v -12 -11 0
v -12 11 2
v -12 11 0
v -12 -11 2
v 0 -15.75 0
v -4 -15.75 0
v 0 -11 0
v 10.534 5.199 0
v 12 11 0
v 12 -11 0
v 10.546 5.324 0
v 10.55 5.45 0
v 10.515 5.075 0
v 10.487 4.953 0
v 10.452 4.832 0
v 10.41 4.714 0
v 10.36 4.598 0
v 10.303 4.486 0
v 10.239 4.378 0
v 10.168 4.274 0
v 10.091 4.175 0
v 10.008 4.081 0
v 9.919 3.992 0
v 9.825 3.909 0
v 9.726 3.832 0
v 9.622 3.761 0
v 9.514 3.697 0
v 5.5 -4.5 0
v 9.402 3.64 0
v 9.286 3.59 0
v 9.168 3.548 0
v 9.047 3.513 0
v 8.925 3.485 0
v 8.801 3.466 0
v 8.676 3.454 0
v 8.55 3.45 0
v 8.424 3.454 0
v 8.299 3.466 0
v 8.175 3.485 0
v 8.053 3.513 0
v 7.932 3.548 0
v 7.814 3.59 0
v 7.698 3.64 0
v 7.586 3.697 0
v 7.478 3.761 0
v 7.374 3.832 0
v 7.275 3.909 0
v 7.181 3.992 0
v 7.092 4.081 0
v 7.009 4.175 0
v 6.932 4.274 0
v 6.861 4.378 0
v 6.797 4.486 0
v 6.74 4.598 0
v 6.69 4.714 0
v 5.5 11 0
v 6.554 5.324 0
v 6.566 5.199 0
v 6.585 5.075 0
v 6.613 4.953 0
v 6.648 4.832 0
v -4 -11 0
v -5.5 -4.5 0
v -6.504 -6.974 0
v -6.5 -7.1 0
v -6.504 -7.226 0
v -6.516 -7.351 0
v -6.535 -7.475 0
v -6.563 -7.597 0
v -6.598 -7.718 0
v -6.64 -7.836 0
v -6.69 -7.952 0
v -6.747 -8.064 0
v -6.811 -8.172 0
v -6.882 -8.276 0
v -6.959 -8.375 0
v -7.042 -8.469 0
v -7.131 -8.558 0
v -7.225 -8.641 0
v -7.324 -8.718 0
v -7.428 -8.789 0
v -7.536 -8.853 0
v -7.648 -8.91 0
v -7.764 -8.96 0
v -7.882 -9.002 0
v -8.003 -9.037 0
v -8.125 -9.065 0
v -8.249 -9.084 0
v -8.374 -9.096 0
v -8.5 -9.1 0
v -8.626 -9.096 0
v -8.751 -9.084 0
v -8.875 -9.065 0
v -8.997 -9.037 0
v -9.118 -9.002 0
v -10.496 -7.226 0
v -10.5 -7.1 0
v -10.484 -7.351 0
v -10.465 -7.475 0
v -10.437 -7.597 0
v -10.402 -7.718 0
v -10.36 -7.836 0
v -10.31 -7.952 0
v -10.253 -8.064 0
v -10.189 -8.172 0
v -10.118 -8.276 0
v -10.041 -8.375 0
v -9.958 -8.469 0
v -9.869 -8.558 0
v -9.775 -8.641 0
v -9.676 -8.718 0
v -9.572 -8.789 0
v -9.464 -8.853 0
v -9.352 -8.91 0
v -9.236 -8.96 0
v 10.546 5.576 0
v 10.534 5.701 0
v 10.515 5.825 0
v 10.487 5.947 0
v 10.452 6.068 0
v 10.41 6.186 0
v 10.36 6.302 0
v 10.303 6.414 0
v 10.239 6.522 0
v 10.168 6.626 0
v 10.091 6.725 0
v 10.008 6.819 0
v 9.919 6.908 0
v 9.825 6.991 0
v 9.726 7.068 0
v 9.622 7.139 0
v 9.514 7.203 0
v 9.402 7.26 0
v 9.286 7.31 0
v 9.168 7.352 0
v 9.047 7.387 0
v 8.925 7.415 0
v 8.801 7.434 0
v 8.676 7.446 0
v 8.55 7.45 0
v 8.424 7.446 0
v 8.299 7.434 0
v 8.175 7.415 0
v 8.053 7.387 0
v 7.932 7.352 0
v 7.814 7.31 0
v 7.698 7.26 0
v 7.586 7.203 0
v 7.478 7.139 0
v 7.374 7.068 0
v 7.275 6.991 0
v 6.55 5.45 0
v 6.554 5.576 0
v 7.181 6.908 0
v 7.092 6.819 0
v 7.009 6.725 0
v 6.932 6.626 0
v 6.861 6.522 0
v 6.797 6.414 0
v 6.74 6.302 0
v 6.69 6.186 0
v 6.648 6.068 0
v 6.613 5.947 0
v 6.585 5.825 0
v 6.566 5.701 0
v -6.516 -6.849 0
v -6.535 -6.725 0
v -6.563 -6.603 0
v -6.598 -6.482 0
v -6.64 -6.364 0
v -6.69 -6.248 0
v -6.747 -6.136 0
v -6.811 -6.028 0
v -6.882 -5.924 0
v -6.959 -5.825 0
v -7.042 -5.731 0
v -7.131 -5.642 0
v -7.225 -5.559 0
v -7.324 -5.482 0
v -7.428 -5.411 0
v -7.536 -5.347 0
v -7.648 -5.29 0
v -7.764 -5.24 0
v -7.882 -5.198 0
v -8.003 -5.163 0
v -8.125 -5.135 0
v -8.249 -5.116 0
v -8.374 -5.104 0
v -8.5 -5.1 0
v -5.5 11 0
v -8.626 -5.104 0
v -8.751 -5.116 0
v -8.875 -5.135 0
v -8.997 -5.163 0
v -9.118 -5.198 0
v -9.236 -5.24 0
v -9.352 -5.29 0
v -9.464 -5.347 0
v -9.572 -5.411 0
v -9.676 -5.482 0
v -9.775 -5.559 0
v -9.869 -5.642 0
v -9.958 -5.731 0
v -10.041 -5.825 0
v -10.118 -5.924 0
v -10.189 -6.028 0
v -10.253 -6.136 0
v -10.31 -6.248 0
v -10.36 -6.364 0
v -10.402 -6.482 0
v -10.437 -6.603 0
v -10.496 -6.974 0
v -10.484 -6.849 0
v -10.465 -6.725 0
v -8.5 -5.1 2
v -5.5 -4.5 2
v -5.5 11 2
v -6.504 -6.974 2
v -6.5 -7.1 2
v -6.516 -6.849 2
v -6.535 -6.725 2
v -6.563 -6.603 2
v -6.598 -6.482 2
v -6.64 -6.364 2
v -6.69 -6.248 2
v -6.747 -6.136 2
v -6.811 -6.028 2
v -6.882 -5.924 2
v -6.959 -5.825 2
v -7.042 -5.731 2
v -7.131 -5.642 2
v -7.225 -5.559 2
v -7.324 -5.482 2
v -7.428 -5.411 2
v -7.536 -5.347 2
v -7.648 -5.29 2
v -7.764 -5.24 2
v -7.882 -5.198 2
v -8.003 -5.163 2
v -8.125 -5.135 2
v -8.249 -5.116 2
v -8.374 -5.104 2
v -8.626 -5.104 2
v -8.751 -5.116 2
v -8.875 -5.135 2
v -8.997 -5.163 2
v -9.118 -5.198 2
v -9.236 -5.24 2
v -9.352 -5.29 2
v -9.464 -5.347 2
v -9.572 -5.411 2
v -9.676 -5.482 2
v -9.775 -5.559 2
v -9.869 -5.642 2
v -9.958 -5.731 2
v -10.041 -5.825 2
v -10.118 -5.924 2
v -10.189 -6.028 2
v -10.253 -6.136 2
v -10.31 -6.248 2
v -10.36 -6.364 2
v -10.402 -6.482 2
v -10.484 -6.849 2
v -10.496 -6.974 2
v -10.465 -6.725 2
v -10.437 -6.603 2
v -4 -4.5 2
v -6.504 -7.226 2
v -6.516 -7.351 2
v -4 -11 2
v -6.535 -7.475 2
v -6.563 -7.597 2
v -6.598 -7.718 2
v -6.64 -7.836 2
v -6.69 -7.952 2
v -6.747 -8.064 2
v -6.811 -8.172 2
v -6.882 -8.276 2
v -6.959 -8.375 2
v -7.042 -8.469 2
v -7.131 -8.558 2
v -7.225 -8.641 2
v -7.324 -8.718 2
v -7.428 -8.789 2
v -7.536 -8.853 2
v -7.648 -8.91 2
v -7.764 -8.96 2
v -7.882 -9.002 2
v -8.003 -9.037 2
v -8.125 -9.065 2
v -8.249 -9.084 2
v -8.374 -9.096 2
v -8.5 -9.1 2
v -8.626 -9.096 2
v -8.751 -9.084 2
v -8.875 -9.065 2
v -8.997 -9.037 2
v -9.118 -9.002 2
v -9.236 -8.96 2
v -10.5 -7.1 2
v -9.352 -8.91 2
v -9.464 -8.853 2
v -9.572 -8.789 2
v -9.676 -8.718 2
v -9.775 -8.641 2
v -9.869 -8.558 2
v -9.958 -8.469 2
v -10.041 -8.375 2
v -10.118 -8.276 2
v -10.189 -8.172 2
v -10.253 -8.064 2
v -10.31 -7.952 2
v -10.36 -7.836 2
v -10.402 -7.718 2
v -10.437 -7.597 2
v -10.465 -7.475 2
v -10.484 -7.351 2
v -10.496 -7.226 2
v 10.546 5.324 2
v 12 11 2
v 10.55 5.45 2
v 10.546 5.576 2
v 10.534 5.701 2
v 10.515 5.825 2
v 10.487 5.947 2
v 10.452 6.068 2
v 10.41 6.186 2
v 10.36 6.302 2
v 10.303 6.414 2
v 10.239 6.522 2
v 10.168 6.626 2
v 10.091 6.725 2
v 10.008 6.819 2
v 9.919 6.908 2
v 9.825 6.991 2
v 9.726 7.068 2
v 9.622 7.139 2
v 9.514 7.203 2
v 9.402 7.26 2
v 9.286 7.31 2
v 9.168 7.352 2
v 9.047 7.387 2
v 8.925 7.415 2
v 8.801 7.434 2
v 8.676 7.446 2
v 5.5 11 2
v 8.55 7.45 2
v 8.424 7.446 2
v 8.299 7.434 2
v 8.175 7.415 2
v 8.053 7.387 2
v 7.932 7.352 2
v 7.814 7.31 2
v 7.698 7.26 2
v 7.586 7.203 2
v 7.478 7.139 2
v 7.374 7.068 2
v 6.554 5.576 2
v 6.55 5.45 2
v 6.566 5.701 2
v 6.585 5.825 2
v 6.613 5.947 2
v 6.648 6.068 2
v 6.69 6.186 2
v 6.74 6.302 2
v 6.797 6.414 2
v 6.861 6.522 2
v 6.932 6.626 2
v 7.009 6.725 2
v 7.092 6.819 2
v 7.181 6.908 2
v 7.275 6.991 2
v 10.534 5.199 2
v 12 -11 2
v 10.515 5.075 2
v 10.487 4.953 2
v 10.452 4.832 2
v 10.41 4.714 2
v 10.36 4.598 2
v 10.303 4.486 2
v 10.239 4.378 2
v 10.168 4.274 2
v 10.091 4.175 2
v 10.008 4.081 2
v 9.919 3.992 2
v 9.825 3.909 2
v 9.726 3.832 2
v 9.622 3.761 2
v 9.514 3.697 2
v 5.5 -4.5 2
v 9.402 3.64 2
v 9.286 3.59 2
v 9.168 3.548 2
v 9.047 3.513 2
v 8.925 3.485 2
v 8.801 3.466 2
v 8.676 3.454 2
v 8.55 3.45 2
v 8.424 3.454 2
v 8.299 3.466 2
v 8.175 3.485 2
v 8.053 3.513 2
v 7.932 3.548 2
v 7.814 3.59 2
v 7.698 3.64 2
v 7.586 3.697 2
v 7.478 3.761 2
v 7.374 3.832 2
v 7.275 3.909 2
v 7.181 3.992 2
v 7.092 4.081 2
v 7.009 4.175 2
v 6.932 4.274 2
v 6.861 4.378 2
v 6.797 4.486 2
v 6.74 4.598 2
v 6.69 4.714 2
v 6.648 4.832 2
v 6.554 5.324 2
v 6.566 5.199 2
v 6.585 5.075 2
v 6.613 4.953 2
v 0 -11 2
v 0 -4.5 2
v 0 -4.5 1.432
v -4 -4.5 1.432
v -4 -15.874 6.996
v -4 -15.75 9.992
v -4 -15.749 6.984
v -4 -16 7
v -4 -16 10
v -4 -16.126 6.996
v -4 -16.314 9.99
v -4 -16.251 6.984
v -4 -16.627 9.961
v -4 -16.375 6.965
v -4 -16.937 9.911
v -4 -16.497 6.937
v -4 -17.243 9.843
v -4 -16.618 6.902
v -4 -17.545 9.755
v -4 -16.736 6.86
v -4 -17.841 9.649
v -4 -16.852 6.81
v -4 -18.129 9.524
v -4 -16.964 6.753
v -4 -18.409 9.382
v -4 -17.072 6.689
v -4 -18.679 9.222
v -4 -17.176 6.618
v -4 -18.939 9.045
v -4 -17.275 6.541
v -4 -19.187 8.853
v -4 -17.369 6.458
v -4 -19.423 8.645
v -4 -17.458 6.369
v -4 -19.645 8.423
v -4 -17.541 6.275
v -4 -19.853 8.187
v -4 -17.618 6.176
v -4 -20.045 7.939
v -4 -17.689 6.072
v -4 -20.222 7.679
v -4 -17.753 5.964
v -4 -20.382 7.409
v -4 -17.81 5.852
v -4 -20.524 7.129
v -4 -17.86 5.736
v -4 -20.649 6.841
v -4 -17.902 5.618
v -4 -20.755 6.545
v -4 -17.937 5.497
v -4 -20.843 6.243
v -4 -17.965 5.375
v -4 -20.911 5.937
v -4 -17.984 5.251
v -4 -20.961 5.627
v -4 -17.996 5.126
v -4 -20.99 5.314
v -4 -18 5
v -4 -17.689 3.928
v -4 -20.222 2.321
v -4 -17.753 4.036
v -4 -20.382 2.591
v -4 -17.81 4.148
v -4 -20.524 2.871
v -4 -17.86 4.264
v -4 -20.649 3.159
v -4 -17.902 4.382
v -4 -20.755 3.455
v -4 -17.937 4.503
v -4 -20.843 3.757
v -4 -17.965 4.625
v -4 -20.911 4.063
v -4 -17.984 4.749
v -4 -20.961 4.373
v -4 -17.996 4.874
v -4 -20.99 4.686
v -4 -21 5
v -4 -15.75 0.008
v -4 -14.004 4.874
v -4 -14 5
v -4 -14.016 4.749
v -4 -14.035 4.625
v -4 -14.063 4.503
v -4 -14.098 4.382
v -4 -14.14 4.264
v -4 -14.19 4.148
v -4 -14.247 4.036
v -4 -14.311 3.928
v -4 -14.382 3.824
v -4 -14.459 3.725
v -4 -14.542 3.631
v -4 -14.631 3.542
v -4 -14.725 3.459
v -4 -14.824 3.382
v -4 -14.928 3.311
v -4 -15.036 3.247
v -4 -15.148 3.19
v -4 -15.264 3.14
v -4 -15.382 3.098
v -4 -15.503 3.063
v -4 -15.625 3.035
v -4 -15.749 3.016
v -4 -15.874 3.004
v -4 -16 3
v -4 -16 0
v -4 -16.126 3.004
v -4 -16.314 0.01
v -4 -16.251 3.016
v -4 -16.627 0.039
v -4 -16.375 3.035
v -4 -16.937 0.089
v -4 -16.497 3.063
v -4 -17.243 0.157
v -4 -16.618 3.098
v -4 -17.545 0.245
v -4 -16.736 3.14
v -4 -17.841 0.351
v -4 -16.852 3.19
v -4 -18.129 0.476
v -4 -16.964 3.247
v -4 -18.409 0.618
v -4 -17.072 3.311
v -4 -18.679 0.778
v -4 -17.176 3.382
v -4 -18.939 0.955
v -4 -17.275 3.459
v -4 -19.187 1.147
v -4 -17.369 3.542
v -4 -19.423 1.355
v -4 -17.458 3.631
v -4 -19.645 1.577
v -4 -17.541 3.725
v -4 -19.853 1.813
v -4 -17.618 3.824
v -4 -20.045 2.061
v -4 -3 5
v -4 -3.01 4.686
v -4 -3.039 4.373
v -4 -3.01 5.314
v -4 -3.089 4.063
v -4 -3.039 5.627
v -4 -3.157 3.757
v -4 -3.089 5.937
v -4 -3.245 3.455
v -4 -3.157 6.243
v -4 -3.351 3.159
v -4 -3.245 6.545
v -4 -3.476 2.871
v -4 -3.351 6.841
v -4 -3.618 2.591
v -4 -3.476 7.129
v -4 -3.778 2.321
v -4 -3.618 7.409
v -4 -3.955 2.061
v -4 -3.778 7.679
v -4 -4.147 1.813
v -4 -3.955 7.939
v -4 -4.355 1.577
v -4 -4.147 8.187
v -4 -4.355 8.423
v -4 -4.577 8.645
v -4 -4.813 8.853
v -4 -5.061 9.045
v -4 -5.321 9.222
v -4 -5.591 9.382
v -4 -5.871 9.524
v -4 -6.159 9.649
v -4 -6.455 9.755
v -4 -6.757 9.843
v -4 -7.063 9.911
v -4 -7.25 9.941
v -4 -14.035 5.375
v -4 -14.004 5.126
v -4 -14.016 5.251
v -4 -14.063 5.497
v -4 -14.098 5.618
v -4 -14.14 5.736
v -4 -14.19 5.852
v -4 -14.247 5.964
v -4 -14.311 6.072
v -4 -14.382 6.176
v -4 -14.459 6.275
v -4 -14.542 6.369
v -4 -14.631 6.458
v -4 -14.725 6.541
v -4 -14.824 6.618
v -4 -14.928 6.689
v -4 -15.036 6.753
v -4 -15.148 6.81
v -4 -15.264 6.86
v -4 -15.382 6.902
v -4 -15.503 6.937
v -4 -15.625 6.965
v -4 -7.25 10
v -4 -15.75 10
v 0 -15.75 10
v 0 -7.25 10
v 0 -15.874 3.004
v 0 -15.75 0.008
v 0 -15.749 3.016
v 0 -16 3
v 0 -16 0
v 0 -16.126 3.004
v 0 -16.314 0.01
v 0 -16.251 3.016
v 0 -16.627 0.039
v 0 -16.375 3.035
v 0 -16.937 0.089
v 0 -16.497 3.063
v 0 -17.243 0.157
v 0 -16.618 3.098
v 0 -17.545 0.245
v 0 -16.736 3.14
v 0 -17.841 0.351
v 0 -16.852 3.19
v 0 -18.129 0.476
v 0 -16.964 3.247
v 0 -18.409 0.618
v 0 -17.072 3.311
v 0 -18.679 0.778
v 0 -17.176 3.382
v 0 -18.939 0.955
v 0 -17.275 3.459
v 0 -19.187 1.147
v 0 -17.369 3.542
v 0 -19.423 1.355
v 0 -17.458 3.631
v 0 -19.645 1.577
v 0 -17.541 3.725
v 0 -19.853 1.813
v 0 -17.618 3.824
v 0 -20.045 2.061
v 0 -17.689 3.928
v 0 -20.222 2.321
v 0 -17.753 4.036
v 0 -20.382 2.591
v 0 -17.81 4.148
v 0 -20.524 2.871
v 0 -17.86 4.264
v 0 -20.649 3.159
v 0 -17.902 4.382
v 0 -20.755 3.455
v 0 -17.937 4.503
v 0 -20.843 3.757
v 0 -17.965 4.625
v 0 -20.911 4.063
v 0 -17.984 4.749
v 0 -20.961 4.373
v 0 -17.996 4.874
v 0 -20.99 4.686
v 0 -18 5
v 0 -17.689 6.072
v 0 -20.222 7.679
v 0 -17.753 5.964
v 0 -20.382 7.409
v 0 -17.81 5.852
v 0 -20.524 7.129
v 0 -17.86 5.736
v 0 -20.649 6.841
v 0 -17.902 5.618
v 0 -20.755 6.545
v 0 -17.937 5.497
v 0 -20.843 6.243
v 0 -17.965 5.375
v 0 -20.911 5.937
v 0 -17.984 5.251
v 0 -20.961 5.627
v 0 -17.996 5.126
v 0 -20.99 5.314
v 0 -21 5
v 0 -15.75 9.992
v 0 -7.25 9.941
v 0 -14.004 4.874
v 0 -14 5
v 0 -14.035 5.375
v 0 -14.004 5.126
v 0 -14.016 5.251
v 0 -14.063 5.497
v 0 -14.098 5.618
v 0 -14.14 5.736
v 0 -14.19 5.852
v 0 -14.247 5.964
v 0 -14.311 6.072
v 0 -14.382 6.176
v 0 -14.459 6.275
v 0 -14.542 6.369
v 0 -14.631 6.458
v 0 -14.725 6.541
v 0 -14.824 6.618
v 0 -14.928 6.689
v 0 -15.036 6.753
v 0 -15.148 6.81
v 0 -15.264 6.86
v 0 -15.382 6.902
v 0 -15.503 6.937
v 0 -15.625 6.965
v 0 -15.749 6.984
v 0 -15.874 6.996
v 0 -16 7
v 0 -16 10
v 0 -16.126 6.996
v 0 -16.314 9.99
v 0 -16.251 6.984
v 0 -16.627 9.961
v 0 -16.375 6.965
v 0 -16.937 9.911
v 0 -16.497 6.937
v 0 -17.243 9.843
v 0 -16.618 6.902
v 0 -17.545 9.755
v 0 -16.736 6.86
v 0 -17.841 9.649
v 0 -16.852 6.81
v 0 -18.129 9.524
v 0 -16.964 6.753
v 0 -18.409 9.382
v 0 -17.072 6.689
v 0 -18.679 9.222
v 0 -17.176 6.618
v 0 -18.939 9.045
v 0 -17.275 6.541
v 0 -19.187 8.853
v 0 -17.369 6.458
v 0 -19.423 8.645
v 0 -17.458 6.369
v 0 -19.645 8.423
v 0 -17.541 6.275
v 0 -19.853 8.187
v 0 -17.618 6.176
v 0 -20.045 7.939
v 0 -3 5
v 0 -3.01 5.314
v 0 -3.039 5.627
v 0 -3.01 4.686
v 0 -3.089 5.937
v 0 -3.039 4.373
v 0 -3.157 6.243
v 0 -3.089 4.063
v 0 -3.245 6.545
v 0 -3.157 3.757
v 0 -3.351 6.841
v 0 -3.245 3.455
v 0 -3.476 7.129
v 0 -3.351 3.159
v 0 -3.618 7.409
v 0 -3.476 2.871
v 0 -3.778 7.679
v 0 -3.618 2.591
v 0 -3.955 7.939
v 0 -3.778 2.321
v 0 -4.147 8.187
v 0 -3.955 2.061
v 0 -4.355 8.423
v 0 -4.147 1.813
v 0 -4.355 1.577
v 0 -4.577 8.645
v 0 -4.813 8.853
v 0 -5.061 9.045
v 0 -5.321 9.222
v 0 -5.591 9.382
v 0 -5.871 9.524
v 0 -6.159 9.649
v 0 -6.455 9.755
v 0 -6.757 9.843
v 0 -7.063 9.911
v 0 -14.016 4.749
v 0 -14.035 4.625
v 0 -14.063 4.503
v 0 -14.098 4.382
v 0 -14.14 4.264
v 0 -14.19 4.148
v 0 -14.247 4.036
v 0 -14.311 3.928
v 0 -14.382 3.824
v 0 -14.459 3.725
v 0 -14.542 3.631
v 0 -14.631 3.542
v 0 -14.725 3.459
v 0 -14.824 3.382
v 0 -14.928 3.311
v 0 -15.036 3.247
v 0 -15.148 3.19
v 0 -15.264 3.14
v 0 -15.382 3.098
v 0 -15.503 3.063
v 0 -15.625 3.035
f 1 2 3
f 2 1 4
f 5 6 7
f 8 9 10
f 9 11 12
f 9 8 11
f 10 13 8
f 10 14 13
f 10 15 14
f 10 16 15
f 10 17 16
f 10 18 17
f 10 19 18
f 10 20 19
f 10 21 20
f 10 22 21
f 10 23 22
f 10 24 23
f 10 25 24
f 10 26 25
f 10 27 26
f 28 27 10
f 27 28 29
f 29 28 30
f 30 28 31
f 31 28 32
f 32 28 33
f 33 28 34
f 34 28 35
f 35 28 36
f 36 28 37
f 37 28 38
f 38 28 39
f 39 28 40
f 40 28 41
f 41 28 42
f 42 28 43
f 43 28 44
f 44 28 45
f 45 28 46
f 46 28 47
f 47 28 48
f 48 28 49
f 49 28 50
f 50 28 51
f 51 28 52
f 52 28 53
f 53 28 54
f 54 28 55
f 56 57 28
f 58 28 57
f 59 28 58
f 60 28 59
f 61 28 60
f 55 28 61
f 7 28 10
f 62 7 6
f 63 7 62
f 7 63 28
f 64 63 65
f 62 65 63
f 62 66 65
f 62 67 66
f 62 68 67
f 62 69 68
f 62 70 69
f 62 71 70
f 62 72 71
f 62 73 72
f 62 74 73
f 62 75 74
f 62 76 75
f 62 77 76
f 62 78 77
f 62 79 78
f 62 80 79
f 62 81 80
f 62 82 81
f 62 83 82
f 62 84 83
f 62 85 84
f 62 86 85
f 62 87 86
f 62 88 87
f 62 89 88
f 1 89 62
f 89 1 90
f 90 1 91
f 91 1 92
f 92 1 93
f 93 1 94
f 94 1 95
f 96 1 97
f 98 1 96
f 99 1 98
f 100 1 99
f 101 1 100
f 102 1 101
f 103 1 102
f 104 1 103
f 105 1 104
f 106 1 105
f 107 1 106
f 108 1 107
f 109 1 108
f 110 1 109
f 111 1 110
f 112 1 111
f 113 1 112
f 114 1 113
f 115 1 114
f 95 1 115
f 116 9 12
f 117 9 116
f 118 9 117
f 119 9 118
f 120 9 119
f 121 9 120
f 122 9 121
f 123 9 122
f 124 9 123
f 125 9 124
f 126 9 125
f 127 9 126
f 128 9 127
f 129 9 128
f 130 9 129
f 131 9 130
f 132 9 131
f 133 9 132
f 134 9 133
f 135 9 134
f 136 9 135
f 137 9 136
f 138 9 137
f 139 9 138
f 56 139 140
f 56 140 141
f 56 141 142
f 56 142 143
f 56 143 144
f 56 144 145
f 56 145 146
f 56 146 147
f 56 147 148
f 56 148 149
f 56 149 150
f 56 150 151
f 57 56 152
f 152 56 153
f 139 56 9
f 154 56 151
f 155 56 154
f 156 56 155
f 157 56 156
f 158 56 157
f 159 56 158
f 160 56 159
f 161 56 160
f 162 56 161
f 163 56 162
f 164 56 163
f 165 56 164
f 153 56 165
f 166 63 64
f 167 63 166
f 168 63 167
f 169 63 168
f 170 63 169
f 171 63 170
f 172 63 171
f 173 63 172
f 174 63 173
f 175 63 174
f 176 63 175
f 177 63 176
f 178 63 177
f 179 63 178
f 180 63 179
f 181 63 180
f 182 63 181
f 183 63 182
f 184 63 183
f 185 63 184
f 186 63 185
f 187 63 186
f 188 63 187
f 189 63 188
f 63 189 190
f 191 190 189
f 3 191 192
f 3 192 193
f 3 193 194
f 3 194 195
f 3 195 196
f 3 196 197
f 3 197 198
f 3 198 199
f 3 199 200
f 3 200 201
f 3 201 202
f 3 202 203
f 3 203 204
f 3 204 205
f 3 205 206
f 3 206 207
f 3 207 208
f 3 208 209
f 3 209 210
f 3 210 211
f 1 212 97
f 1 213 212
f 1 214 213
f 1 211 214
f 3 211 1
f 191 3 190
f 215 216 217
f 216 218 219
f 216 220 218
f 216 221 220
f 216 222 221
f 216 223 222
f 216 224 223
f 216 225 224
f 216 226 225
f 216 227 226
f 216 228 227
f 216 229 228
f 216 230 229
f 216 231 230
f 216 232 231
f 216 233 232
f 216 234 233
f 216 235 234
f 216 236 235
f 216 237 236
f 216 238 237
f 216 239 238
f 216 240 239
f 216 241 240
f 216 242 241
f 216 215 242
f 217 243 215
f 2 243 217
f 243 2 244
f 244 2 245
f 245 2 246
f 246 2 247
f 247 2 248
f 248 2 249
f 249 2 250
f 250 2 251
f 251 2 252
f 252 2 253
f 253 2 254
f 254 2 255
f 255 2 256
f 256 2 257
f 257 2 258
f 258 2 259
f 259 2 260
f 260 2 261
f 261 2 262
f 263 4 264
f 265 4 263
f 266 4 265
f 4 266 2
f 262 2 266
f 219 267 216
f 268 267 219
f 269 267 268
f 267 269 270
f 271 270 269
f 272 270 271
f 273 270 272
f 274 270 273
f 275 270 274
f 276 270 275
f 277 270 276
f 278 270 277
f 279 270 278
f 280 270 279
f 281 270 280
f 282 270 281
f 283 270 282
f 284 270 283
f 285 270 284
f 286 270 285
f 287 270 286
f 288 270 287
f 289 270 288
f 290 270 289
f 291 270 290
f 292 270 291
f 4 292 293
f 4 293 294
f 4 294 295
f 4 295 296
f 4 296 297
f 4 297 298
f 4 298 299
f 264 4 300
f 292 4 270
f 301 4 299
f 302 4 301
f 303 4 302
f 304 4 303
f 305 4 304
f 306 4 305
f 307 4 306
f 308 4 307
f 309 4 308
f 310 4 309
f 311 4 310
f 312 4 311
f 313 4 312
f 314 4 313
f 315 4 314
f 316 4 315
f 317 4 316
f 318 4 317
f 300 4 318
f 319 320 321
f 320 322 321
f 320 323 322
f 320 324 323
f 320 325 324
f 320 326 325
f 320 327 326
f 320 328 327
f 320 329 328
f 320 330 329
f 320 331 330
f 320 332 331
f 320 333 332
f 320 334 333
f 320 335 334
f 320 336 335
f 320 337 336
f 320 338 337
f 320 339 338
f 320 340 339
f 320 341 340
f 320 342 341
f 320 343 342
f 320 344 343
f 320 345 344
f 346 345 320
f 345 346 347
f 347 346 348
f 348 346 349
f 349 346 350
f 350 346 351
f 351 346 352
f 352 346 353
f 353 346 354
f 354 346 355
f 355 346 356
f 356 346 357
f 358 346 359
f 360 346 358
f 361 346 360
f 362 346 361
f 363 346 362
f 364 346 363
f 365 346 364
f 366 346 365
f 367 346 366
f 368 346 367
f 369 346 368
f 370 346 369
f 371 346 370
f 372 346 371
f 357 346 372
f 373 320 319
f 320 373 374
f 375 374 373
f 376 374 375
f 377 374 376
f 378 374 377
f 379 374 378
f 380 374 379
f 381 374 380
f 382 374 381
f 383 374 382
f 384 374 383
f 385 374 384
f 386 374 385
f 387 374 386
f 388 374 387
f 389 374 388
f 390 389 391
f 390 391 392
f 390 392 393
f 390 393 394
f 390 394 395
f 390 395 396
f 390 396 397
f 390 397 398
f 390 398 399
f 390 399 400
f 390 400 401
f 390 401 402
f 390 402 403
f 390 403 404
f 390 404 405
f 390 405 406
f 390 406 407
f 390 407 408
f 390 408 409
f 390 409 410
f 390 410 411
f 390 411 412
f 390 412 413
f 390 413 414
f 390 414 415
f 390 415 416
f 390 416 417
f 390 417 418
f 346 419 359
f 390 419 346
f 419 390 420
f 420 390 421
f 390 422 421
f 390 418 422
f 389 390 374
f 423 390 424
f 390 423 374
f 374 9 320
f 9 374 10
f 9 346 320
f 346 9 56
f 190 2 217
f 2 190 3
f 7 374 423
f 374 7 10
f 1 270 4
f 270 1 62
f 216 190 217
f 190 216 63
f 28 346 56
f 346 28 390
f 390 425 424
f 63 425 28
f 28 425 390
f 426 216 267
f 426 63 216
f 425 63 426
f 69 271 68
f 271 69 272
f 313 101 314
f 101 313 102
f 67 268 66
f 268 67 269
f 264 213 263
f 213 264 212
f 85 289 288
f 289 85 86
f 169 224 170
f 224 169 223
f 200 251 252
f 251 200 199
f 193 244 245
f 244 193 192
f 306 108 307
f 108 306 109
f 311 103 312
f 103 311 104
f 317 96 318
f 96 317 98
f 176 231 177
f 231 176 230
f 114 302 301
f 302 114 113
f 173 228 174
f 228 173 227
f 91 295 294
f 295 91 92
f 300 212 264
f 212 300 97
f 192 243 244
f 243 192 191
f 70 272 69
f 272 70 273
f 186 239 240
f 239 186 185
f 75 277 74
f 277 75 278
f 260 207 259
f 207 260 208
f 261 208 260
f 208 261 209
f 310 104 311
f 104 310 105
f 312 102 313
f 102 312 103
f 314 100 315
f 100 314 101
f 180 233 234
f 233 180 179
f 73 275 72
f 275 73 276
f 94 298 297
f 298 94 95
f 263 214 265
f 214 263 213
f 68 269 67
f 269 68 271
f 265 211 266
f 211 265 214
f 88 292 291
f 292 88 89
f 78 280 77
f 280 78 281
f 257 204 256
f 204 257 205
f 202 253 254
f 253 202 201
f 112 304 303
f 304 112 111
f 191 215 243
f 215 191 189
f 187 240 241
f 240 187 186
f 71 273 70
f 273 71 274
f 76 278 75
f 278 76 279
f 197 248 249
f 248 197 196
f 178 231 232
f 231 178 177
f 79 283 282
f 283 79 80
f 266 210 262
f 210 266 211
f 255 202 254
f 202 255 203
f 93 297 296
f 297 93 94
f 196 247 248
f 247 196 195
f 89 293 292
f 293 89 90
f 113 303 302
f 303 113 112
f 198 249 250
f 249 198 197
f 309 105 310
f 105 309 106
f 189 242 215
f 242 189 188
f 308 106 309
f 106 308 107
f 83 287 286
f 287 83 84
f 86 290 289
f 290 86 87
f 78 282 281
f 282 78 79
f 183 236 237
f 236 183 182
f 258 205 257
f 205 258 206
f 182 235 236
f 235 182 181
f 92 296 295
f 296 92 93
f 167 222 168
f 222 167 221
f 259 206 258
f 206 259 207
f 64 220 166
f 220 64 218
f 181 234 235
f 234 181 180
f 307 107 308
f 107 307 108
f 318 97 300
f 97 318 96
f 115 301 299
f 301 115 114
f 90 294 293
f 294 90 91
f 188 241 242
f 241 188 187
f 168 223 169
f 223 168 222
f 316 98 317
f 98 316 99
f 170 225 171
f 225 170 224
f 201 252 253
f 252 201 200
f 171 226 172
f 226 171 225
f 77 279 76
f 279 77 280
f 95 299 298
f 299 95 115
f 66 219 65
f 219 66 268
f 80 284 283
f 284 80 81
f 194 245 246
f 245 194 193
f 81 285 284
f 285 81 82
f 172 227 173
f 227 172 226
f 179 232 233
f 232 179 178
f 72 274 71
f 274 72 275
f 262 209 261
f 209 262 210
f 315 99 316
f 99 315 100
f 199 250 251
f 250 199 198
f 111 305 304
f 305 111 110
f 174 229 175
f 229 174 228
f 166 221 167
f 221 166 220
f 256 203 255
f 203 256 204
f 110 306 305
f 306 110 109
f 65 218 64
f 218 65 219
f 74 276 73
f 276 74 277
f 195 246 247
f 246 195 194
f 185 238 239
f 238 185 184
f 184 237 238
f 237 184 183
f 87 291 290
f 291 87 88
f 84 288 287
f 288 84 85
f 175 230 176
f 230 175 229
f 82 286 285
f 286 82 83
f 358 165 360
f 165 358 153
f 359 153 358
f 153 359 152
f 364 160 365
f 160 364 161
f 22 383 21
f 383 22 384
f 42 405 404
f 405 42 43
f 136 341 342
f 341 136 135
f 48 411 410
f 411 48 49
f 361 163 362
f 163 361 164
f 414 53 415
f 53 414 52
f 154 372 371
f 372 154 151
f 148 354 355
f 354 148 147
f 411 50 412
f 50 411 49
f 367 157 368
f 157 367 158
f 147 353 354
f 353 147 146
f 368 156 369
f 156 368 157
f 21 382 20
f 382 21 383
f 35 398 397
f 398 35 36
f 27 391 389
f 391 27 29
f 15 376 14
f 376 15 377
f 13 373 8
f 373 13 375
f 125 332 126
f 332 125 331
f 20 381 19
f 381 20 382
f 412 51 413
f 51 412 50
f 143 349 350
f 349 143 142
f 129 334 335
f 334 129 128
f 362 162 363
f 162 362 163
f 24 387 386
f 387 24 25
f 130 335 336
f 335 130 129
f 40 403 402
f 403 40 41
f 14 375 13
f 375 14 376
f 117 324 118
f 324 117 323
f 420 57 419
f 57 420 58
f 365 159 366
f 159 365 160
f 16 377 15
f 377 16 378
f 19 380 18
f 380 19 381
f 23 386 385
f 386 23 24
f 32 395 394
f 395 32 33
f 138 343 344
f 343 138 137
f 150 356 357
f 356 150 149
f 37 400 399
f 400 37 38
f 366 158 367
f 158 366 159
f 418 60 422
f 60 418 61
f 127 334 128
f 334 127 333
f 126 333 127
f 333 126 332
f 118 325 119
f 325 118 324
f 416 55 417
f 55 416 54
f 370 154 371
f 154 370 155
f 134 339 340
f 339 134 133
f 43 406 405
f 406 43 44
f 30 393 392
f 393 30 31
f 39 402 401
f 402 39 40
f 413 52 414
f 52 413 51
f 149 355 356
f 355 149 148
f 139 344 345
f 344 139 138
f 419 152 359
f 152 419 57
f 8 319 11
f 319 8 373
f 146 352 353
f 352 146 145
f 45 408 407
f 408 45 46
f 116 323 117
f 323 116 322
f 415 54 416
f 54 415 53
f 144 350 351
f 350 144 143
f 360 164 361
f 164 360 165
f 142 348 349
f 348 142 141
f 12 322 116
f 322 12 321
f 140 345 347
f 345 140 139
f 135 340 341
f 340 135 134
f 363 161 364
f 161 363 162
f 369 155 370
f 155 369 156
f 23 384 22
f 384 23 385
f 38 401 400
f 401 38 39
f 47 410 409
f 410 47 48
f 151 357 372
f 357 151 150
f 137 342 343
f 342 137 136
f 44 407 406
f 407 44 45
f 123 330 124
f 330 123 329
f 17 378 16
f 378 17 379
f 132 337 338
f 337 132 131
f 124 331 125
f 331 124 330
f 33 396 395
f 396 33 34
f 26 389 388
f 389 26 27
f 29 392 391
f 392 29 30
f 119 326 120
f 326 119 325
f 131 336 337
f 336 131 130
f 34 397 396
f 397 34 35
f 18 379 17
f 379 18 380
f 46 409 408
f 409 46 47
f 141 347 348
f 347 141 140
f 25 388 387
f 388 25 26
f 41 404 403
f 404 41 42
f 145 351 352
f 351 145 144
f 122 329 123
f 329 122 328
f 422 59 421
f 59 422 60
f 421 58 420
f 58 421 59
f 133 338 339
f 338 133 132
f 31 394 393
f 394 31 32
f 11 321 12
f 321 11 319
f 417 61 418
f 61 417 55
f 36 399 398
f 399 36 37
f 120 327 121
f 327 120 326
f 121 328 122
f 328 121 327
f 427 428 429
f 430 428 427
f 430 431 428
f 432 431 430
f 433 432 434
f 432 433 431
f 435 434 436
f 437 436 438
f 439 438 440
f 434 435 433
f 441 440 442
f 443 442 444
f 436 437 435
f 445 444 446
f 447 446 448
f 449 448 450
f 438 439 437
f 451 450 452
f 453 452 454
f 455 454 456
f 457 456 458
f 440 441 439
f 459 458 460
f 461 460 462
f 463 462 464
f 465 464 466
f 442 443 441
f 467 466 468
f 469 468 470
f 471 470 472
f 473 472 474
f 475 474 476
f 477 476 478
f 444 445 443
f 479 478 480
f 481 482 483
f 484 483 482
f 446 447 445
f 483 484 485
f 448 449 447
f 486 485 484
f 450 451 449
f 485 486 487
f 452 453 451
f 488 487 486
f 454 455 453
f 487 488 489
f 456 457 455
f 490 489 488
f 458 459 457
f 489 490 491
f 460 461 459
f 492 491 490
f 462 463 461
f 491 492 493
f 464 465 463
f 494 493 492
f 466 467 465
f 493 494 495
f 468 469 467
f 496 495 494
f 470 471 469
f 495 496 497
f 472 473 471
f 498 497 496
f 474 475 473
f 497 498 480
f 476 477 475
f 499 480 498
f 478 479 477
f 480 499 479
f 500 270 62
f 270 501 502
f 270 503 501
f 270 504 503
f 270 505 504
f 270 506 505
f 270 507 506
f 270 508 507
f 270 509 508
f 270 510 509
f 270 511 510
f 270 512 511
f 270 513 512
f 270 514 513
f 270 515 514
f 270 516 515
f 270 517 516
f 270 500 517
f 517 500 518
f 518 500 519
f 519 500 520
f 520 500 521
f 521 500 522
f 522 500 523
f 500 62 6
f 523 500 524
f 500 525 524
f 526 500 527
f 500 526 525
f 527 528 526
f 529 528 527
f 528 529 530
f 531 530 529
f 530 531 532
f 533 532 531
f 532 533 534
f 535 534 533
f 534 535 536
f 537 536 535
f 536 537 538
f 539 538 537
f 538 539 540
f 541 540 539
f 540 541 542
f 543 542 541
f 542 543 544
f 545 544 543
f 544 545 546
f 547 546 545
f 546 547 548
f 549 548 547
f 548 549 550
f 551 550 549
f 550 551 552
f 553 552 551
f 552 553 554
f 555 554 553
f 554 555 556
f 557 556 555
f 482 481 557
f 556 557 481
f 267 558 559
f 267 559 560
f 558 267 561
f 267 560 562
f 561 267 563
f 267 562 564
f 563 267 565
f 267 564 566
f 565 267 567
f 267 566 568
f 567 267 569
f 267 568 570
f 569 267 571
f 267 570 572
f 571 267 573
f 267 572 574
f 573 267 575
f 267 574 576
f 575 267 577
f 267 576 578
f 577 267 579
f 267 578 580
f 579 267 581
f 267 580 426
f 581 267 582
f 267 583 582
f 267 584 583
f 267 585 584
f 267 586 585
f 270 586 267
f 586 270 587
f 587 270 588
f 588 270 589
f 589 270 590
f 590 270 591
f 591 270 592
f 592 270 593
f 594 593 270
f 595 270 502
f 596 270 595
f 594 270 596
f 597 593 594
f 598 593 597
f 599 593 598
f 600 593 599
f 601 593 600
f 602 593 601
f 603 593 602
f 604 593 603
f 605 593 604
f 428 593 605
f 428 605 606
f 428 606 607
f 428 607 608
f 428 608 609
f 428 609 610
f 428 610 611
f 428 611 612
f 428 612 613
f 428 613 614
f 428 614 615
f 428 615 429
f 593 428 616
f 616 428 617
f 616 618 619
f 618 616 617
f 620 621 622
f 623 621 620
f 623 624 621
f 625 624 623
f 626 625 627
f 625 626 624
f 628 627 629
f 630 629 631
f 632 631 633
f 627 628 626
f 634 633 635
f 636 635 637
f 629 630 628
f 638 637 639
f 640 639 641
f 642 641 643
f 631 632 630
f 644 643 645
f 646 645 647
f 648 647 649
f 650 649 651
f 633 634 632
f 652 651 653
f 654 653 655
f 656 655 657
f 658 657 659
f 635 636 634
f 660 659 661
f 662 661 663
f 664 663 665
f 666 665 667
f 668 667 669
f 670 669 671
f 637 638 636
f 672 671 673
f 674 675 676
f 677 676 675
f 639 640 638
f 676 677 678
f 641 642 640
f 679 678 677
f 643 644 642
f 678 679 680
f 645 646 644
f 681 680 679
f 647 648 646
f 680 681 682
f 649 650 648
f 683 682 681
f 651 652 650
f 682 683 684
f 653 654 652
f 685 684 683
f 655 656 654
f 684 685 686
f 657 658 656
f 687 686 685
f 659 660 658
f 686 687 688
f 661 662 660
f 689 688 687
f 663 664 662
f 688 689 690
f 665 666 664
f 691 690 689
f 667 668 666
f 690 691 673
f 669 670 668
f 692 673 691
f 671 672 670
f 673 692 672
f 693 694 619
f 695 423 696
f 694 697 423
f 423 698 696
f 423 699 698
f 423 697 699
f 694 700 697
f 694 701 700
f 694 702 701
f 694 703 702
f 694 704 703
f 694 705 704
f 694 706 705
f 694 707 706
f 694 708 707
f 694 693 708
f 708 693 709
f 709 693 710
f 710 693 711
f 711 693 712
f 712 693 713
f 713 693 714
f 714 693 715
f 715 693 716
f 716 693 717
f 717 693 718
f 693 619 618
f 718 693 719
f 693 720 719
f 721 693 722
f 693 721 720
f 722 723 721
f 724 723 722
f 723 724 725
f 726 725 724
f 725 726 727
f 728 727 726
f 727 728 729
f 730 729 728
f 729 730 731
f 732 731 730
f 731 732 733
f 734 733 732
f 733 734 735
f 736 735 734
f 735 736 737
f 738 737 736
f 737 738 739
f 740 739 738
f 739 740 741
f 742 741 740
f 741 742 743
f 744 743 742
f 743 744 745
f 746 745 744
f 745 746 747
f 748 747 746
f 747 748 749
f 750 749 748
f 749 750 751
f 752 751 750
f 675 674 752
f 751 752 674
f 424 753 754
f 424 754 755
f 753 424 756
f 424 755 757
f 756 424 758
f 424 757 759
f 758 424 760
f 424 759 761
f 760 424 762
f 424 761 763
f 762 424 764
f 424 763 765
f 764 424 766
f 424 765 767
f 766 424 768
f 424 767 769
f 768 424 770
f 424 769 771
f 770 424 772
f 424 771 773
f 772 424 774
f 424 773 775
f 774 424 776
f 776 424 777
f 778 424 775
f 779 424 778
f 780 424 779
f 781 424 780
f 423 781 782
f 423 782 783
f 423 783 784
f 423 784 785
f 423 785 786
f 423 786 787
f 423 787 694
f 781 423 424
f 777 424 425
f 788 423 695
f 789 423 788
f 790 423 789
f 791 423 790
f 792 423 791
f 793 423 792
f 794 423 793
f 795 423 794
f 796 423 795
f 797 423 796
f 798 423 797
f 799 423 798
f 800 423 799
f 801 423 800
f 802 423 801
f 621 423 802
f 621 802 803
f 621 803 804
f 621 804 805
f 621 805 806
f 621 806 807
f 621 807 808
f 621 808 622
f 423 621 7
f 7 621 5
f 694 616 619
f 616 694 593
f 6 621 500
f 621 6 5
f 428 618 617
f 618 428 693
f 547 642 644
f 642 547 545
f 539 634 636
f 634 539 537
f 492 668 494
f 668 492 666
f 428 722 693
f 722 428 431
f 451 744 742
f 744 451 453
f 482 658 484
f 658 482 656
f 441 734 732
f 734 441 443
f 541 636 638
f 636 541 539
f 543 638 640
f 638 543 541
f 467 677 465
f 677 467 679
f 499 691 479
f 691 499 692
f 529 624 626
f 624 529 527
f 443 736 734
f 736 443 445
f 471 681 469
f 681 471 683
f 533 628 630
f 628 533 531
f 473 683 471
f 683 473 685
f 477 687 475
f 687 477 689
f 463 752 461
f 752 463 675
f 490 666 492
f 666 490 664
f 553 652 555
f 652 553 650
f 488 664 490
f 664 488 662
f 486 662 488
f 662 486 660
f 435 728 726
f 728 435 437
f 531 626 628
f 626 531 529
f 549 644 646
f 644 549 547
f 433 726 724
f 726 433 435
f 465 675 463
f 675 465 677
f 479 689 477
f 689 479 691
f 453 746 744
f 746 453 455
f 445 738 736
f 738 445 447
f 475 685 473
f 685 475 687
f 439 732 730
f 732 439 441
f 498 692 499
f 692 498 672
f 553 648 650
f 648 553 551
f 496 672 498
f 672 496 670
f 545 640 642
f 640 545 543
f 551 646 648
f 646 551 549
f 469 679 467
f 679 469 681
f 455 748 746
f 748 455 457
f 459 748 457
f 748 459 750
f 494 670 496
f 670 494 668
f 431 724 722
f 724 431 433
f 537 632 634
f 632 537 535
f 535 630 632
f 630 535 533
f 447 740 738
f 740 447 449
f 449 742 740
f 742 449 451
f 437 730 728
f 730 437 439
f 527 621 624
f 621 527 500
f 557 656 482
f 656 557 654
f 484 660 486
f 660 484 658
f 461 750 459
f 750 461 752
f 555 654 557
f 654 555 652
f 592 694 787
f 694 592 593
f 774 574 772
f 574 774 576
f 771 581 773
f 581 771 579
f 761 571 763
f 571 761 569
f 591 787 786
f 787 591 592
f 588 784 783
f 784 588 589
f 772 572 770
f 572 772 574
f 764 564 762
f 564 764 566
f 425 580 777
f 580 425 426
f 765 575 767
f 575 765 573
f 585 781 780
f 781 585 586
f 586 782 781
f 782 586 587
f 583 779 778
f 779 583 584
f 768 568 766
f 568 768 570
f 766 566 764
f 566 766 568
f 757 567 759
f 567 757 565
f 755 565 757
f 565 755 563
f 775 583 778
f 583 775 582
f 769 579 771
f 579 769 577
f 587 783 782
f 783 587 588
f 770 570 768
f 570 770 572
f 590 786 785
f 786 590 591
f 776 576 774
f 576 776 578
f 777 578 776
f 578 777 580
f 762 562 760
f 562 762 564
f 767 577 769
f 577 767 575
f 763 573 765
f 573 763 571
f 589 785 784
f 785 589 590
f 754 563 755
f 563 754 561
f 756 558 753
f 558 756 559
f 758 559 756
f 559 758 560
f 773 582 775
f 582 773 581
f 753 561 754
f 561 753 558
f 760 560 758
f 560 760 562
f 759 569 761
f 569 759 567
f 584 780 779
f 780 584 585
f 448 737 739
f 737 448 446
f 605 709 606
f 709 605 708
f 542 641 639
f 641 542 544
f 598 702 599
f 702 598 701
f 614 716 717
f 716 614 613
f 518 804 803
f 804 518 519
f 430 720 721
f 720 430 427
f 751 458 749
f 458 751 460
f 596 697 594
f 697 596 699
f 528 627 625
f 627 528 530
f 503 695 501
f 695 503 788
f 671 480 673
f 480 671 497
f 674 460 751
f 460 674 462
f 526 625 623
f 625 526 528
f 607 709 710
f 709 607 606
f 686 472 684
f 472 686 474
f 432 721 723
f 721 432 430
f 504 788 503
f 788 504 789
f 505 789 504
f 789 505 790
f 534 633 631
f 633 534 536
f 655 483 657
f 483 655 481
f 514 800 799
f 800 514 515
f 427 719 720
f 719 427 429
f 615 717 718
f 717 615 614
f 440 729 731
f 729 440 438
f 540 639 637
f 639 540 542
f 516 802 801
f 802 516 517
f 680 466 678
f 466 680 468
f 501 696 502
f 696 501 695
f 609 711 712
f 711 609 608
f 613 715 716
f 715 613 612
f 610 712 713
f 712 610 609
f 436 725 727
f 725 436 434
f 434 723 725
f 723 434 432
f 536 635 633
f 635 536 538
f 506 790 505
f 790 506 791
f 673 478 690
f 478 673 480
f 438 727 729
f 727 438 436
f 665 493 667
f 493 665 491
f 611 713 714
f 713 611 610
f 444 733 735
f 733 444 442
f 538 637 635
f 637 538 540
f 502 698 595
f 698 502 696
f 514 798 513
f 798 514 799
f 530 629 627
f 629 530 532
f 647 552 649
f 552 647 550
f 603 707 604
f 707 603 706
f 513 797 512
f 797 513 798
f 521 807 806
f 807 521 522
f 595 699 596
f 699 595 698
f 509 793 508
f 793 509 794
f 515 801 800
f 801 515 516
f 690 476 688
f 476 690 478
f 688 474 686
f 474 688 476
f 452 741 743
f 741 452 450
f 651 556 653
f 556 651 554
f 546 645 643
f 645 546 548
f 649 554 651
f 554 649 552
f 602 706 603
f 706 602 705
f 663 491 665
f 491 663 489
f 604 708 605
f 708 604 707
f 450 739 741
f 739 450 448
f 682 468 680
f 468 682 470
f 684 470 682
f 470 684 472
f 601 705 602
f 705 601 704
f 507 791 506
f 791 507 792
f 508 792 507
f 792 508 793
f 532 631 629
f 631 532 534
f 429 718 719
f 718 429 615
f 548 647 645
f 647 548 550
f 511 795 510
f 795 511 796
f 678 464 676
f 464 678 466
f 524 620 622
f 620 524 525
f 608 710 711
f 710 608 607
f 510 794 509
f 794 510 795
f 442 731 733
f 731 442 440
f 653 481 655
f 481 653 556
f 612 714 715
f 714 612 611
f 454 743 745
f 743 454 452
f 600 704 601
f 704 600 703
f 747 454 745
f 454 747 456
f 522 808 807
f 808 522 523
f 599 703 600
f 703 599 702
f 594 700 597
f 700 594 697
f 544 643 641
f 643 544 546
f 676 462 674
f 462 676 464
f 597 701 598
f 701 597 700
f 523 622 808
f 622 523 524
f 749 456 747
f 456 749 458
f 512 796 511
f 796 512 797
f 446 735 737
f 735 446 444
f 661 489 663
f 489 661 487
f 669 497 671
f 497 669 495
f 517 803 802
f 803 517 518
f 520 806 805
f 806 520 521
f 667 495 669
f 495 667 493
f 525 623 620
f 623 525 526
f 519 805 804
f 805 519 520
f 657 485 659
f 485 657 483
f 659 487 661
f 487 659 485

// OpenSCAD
$fn=100;

module frame() {
	difference() {
		cube([24, 22, 2], center=true);
		translate([0, 5, 0])
			cube([11, 19, 4], center=true);
		translate([11-1.5-1.0, -10+1.5+1.4, -5])
			cylinder(r=2, h=10);
		translate([-11+1.5+0.95, +10-1.5-3.05, -5])
			cylinder(r=2, h=10);
	}

	difference() {
	translate([0, -16, -4]) {
		translate([2, 4.5, 0])
			cube([4, 8.5, 10], center=true);
		rotate([0, 90, 0])
			cylinder(r=5, h=4);
		translate([0, 8, 0])
			rotate([0, 90, 0])
				cylinder(r=5, h=4);
	}
	translate([-12, -16, -4]) 
		rotate([0, 90, 0])
			cylinder(r=2, h=30);
	}
}

module mb1000() {
	translate([0, 0, 2]) {
		difference() {
			cube([22, 20, 1.8], center=true);
			translate([11-1.5-1.0, -10+1.5+1.4, -5])
				cylinder(r=1.5, h=10);
			translate([-11+1.5+0.95, +10-1.5-3.05, -5])
				cylinder(r=1.5, h=10);
		}

		translate([0, 0, 1.8/2])
			cylinder(r=16.35/2, h=14);
	}
}

module show() {
	#mb1000();
	frame();
}

module print() {
	translate([0, 0, 1])
		rotate([0, 180, 0])
			frame();
}

print();
